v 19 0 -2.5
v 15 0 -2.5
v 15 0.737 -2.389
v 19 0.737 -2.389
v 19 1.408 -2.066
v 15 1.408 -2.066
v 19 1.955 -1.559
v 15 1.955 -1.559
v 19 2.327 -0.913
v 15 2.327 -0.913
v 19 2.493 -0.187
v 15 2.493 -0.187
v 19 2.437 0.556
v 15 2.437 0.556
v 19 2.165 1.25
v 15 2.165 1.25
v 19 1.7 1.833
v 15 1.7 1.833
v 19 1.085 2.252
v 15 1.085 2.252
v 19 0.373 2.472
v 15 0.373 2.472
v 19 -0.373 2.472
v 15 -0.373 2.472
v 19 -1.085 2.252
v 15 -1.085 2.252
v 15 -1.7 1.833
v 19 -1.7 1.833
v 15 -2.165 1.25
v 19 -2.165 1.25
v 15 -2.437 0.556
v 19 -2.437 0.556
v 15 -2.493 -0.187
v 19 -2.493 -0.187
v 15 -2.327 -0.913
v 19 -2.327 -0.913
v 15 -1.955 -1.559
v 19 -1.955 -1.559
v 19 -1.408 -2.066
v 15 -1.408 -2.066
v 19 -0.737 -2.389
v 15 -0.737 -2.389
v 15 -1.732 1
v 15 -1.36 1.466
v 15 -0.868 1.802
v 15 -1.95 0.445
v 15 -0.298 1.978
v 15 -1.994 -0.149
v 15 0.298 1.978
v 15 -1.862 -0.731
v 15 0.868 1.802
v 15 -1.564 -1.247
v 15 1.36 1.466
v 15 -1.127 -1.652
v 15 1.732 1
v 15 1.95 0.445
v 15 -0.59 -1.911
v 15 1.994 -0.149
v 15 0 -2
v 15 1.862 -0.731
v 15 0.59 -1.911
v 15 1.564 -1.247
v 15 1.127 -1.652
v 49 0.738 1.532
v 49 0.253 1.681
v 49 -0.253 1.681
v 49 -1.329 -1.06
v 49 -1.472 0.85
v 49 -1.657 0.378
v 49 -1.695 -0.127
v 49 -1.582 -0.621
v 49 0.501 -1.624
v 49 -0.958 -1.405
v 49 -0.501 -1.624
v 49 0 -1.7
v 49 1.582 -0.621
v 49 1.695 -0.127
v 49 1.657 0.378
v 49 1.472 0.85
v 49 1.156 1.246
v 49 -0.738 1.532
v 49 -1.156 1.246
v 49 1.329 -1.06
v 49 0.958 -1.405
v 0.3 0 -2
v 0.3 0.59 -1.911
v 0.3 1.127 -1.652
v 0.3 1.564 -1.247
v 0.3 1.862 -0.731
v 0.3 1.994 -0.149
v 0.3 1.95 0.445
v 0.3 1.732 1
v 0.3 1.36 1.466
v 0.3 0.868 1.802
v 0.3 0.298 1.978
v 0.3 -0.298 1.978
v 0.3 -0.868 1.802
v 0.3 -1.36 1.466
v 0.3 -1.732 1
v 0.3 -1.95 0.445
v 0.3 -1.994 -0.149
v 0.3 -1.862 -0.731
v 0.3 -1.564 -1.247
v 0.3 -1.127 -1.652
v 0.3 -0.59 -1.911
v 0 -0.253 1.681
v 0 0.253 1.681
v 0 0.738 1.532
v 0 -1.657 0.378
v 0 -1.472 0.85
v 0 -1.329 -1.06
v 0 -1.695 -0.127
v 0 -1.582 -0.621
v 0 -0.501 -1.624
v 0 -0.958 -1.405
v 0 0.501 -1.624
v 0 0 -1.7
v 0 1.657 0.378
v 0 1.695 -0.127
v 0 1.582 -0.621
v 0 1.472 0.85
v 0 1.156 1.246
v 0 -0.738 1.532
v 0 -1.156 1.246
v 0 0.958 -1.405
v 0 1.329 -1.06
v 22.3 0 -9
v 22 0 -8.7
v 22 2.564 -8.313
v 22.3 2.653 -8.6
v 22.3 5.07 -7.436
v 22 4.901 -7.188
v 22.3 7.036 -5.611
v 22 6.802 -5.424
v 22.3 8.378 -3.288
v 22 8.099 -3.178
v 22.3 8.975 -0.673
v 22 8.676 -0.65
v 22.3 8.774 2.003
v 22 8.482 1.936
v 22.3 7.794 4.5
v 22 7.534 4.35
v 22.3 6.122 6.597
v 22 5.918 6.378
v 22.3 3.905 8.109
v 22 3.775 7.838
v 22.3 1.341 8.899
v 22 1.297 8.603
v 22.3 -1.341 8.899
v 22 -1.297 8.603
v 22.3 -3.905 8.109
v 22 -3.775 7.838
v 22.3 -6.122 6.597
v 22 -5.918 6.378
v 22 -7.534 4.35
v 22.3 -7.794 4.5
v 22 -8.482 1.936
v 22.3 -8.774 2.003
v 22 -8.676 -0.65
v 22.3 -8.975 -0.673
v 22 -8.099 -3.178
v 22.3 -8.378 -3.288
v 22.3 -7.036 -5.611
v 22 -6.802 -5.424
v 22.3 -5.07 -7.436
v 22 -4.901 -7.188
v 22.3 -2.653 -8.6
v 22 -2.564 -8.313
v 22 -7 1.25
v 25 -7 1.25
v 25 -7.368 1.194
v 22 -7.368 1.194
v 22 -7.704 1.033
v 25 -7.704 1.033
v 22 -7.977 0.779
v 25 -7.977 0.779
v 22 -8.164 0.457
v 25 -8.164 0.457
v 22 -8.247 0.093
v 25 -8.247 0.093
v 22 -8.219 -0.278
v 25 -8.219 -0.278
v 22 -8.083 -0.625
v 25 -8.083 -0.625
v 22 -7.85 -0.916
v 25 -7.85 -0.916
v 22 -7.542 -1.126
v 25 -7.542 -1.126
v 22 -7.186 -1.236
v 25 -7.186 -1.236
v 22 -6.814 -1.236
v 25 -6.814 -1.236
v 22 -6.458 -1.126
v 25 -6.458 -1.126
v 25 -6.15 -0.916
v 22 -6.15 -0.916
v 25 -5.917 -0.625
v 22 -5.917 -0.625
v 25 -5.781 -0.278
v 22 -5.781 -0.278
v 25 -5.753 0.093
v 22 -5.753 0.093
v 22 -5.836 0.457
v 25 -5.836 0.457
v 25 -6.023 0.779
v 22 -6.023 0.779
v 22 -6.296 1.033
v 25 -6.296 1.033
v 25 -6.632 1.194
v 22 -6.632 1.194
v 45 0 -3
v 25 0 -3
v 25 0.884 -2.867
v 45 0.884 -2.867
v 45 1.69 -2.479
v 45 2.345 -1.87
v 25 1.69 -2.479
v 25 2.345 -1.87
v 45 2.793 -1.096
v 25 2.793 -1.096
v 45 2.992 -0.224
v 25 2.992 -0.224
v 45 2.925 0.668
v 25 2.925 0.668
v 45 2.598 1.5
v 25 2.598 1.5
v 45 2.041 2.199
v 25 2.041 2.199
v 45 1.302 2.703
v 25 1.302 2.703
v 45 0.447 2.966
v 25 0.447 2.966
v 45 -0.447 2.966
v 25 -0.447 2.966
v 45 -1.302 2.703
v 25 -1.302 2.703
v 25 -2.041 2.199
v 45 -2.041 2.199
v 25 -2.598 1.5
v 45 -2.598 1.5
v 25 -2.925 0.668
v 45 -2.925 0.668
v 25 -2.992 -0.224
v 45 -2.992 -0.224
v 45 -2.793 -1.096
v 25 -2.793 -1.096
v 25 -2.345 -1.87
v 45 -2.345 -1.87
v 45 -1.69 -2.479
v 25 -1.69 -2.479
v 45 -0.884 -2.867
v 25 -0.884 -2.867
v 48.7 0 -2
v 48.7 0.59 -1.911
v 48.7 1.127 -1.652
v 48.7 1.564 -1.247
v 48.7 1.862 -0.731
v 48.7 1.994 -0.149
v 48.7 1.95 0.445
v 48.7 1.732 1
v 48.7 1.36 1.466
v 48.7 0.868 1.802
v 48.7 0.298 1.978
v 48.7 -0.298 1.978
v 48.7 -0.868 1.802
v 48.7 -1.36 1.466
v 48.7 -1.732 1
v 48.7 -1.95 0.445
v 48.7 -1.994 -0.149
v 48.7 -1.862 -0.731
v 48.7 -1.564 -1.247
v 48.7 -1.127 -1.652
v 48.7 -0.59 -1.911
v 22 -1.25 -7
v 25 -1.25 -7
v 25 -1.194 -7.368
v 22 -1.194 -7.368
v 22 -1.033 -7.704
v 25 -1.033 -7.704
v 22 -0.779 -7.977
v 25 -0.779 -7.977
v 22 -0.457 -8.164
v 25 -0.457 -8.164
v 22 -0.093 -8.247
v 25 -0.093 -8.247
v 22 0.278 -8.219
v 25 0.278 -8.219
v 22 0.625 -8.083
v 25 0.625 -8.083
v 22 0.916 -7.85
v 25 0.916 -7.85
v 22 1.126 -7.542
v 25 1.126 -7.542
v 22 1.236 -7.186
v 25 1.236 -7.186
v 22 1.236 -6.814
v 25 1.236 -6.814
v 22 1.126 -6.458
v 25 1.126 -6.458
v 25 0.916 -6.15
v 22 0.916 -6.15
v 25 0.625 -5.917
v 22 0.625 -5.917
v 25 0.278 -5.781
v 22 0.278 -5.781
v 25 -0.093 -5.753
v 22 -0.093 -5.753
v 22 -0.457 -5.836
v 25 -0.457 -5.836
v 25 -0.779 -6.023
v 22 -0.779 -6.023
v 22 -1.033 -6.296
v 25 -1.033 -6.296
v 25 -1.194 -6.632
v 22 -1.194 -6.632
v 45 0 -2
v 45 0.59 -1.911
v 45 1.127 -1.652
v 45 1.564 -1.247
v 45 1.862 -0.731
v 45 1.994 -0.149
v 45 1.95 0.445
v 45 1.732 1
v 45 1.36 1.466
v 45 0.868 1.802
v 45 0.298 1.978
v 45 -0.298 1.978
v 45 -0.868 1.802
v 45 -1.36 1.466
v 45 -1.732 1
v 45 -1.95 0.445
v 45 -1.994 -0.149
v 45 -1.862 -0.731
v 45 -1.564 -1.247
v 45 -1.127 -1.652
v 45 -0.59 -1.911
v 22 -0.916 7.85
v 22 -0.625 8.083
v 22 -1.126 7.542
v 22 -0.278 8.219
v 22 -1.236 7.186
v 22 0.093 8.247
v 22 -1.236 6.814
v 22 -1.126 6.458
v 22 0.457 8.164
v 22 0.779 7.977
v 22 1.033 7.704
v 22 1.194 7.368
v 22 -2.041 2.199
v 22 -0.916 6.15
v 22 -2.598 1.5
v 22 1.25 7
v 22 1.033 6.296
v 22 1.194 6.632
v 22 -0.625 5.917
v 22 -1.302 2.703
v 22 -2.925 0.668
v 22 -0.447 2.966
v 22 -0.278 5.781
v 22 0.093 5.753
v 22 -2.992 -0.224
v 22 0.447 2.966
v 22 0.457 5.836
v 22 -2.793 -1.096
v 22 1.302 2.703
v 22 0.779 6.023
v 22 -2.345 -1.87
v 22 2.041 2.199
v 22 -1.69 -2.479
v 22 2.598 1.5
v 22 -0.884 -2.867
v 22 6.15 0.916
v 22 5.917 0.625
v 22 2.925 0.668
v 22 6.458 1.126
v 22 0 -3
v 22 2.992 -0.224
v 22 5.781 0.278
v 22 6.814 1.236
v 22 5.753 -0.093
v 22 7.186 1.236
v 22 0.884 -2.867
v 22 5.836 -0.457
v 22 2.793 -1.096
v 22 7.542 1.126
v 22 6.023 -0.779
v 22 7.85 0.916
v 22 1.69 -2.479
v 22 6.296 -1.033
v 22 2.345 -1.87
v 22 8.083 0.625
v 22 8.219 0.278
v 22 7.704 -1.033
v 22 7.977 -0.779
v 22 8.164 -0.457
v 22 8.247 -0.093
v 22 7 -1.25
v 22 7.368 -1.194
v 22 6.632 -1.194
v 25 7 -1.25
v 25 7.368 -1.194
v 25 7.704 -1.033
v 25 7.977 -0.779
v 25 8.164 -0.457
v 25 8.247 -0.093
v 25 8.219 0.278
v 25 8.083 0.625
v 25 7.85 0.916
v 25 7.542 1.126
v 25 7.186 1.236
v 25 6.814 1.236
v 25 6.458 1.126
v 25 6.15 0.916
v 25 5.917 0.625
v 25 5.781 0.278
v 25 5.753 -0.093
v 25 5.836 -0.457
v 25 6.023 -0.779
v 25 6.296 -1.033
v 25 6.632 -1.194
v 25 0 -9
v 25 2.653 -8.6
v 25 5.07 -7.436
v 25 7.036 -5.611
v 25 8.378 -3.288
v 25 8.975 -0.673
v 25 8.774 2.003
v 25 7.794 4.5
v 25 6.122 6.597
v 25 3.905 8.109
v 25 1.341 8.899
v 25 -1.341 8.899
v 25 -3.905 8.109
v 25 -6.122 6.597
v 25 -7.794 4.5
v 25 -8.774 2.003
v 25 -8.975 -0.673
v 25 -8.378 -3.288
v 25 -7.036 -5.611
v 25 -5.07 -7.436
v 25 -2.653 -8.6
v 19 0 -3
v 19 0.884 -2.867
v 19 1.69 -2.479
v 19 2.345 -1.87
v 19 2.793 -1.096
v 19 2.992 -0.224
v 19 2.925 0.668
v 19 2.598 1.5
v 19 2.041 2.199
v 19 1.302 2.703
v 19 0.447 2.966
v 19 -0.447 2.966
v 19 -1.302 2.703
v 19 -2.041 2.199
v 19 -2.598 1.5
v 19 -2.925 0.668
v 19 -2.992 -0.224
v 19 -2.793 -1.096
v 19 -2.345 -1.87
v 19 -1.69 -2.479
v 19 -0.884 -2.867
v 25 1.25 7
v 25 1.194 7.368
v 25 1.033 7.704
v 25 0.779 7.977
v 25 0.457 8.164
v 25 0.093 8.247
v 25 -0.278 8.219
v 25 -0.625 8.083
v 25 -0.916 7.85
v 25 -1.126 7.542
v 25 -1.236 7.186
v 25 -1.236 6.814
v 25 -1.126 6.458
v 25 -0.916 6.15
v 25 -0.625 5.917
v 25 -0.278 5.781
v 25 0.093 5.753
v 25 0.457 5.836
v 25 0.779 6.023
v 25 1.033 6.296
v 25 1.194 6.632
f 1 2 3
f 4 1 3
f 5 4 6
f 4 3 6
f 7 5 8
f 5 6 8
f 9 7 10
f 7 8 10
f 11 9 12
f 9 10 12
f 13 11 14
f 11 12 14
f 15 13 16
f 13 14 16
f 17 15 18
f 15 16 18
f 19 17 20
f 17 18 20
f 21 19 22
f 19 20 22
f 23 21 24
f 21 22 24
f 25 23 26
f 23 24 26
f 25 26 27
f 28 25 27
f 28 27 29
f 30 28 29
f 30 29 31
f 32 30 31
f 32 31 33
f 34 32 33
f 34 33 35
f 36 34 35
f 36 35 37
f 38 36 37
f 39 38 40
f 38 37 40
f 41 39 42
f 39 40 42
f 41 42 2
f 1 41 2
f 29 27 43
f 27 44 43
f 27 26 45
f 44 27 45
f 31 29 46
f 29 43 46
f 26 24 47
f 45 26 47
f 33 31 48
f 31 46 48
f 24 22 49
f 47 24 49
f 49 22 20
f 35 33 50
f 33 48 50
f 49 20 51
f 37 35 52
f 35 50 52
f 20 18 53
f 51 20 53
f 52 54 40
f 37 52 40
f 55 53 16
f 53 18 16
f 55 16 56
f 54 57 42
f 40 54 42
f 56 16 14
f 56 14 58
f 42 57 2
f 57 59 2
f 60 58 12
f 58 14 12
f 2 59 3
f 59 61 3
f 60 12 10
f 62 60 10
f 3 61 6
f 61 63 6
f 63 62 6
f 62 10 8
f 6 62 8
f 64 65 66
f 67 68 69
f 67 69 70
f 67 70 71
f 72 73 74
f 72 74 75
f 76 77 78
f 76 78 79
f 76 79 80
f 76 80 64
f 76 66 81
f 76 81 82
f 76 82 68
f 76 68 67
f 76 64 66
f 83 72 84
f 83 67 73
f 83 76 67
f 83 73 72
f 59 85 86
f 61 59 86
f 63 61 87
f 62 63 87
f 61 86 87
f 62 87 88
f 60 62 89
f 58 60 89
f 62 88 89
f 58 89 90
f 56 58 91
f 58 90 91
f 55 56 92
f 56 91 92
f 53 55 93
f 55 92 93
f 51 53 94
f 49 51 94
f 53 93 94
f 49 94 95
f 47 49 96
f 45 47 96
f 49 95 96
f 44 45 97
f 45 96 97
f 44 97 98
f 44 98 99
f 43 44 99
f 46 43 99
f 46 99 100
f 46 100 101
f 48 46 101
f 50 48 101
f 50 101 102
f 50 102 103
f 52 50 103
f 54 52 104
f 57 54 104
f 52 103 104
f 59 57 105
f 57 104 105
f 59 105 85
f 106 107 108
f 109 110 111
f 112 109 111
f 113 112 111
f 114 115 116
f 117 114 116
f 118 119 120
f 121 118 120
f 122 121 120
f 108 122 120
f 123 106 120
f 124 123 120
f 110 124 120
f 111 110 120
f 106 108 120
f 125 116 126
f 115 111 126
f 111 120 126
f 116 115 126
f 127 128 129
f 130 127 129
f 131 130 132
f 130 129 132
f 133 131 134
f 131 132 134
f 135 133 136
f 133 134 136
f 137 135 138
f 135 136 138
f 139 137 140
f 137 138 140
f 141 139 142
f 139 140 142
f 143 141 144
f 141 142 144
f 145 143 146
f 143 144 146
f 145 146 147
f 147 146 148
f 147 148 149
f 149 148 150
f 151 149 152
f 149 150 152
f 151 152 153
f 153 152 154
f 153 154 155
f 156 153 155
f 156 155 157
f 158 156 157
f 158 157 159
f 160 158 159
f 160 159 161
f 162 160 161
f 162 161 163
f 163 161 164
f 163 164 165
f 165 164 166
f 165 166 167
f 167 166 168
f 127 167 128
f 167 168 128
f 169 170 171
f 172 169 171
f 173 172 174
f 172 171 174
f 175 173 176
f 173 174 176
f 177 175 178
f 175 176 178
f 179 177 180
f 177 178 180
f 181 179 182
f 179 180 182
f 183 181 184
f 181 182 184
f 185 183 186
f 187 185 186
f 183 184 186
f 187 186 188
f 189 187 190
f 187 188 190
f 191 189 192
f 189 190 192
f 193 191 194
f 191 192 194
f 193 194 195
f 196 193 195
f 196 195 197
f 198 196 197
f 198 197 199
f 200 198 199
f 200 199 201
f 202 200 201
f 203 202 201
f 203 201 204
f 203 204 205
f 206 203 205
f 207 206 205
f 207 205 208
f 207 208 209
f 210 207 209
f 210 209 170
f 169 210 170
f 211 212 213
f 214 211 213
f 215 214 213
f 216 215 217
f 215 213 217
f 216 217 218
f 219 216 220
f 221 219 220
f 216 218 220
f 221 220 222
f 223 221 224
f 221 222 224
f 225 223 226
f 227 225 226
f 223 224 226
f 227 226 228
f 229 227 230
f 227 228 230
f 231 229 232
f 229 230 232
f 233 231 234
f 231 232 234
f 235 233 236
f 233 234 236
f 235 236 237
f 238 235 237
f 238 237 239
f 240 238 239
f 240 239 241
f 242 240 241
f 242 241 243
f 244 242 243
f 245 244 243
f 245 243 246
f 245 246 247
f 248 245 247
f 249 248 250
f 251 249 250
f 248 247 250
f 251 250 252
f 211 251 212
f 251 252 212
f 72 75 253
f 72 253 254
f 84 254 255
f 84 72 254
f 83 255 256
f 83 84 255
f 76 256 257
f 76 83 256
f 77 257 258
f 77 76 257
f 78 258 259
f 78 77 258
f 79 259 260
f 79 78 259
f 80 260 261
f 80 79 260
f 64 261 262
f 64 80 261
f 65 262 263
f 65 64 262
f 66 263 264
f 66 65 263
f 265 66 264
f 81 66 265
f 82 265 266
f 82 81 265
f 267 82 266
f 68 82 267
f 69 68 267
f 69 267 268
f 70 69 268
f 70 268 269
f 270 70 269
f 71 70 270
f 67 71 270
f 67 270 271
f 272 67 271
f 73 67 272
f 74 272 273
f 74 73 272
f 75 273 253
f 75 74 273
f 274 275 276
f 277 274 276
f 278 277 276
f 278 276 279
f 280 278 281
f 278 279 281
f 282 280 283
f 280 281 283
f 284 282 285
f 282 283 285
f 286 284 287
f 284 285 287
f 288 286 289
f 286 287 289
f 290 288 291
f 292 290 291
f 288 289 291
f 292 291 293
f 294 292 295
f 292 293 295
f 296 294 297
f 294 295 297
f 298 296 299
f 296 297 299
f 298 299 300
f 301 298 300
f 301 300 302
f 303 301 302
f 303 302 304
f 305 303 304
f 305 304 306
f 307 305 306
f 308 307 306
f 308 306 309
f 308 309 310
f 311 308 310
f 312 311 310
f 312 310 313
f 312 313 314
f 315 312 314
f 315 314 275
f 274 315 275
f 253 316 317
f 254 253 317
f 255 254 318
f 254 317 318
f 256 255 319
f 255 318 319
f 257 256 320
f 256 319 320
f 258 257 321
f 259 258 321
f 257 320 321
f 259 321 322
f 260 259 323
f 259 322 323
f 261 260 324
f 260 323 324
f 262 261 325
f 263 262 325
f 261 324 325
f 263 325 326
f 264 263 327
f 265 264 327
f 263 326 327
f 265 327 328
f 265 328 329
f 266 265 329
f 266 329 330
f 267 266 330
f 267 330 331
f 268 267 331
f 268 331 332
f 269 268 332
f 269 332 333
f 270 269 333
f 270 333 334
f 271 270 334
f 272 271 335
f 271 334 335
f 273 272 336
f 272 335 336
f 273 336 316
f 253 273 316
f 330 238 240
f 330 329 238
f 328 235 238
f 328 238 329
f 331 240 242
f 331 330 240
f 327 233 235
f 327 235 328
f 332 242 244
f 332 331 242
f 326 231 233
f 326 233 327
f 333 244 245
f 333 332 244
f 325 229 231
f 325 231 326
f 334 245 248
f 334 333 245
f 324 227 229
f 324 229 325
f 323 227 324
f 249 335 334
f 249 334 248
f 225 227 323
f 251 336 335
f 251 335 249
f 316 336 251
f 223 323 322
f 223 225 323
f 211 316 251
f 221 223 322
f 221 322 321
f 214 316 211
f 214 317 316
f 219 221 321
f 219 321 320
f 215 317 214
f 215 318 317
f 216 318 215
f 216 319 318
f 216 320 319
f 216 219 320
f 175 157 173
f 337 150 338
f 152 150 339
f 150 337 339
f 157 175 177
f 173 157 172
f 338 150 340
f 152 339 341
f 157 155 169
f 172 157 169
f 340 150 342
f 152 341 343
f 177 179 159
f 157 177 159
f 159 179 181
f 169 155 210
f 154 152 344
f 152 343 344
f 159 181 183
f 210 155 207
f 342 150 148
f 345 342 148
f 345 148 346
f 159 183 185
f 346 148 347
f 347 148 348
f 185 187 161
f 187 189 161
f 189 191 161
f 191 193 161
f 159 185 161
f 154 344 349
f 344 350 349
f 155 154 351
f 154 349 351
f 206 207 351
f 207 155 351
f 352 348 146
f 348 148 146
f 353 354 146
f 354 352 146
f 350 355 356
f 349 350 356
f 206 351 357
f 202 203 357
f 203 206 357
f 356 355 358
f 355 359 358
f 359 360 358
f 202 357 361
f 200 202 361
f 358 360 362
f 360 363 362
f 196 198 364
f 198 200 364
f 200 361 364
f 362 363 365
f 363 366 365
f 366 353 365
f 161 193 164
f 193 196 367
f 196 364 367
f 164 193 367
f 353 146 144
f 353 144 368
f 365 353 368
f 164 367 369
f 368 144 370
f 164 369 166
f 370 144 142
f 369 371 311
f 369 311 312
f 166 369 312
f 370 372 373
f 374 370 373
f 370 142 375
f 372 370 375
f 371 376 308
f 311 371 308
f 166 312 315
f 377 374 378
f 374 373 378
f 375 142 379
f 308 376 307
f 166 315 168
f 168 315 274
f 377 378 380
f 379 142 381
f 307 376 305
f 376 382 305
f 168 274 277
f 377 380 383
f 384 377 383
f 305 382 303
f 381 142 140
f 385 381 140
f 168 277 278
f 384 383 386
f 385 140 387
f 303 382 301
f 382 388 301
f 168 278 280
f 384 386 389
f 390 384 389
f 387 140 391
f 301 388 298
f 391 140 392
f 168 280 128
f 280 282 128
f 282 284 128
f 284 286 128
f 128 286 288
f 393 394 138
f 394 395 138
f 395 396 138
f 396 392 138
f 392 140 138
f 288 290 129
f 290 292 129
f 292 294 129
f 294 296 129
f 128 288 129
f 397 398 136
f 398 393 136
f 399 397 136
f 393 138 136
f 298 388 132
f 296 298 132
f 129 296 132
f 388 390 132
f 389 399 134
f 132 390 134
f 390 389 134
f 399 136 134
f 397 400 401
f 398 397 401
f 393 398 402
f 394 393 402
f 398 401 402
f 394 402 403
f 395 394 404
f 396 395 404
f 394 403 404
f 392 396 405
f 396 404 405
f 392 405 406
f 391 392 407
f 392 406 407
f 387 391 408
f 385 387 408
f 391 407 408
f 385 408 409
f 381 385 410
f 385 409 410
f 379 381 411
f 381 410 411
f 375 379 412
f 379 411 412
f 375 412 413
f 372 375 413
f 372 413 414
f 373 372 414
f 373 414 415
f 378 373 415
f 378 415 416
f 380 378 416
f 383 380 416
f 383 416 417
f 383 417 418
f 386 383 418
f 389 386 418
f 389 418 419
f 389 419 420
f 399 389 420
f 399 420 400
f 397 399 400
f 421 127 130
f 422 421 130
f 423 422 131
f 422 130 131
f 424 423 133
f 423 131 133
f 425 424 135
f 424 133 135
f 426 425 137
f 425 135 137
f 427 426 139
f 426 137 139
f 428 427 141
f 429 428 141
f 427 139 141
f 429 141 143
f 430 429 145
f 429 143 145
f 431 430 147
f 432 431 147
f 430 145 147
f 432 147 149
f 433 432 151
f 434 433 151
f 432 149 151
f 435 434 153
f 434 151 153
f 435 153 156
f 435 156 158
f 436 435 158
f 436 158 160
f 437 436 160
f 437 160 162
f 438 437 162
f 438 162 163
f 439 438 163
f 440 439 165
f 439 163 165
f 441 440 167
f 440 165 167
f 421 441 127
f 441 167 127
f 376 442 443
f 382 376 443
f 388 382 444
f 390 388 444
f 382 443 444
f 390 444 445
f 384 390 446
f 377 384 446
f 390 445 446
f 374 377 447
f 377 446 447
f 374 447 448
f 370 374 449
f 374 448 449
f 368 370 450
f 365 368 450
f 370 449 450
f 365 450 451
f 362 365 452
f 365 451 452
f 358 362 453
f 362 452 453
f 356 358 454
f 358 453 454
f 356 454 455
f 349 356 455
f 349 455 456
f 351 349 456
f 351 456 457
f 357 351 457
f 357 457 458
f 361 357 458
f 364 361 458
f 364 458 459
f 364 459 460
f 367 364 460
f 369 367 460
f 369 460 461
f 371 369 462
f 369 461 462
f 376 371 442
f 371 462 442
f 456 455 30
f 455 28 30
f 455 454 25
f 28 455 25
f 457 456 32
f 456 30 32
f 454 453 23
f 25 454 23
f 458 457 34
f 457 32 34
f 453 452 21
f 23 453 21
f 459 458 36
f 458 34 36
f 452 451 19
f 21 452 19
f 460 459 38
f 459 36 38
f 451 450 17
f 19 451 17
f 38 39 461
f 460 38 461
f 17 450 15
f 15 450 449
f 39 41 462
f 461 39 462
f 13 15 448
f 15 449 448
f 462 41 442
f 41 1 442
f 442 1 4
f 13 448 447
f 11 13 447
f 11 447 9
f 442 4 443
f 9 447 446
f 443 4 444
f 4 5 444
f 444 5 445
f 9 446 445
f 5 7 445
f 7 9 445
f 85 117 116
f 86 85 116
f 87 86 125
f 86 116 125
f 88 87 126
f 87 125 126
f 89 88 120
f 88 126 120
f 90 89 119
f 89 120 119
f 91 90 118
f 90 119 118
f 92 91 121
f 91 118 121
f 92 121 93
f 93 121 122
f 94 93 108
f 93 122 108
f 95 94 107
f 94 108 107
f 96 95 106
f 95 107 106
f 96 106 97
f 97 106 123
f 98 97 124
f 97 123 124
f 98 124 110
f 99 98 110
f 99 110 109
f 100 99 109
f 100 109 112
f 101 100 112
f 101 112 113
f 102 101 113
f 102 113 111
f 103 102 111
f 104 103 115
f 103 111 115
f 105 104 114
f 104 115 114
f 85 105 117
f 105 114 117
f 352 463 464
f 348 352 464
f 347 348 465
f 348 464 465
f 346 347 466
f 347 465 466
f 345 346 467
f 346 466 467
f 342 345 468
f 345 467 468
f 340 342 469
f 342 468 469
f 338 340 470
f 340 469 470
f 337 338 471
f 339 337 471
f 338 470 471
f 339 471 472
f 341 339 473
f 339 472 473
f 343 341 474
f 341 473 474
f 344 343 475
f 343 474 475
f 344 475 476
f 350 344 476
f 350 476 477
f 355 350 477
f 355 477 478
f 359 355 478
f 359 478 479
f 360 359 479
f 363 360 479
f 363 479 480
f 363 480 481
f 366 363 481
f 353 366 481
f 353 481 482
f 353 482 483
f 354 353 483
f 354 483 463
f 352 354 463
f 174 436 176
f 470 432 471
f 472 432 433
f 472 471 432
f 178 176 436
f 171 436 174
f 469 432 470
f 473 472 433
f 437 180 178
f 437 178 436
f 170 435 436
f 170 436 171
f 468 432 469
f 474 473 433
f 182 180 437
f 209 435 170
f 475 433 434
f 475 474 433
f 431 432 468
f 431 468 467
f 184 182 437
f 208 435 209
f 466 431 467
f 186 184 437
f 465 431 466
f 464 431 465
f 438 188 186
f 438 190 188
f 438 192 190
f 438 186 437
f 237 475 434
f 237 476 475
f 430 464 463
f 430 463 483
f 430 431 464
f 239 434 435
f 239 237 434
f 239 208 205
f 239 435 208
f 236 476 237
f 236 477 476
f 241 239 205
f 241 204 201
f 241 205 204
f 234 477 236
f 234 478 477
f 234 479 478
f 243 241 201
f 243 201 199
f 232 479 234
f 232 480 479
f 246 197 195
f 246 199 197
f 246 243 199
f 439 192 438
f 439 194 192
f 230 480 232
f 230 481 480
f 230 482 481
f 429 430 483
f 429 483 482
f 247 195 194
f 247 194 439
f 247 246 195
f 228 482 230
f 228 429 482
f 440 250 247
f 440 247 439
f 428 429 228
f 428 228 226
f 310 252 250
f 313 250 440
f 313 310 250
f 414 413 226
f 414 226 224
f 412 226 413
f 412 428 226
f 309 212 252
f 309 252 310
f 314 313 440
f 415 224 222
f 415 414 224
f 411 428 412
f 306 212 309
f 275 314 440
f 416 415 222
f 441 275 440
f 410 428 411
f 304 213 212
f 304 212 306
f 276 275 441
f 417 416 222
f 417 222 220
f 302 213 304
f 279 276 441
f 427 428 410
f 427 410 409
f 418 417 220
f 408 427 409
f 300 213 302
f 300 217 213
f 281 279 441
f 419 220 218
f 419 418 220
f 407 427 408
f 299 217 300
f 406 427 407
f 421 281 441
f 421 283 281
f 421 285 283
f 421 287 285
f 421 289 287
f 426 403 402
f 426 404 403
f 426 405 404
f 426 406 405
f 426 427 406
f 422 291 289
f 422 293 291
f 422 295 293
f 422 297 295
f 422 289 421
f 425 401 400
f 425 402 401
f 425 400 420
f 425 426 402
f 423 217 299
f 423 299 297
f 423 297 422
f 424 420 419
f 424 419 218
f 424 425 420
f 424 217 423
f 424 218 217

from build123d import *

# Parameters (mm, degrees)
SKETCH_1_R               = 2
EXTRUDE_1_DEPTH          = 15
SKETCH_2_R               = 2.5
EXTRUDE_2_DEPTH          = 4
SKETCH_3_R               = 3
EXTRUDE_3_DEPTH          = 3
SKETCH_4_R               = 9
EXTRUDE_4_DEPTH          = 3
SKETCH_5_R               = 3
EXTRUDE_5_DEPTH          = 20
SKETCH_8_R               = 2
EXTRUDE_6_DEPTH          = 4
HOLE_WIZARD_M3_2_D       = 2.5
PATTERN_CIRCULAR_2_COUNT = 4
CHAMFER_1_SIZE           = 0.3


with BuildPart() as part:
    # 草图1 → 凸台-拉伸1 (new body)
    with BuildSketch(Plane(origin=(0, 0, 0), x_dir=(0, 0, -1), z_dir=(1, 0, 0))):
        Circle(SKETCH_1_R)
    extrude(amount=EXTRUDE_1_DEPTH)

    # 草图2 → 凸台-拉伸2 (add)
    with BuildSketch(Plane(origin=(15, 0, 0), x_dir=(0, 0, -1), z_dir=(1, 0, 0))):
        Circle(SKETCH_2_R)
    extrude(amount=EXTRUDE_2_DEPTH)

    # 草图3 → 凸台-拉伸3 (add)
    with BuildSketch(Plane(origin=(19, 0, 0), x_dir=(0, 0, -1), z_dir=(1, 0, 0))):
        Circle(SKETCH_3_R)
    extrude(amount=EXTRUDE_3_DEPTH)

    # 草图4 → 凸台-拉伸4 (add)
    with BuildSketch(Plane(origin=(22, 0, 0), x_dir=(0, 0, -1), z_dir=(1, 0, 0))):
        Circle(SKETCH_4_R)
    extrude(amount=EXTRUDE_4_DEPTH)

    # 草图5 → 凸台-拉伸5 (add)
    with BuildSketch(Plane(origin=(25, 0, 0), x_dir=(0, 0, -1), z_dir=(1, 0, 0))):
        Circle(SKETCH_5_R)
    extrude(amount=EXTRUDE_5_DEPTH)

    # 草图8 → 凸台-拉伸6 (add)
    with BuildSketch(Plane(origin=(45, 0, 0), x_dir=(0, 0, -1), z_dir=(1, 0, 0))):
        Circle(SKETCH_8_R)
    extrude(amount=EXTRUDE_6_DEPTH)

    # M3 螺纹孔2 (through all)
    with Locations(Plane.ZY.offset(-22)):
        with Locations((0, 7)):
            hole_wizard_m3_2 = Hole(HOLE_WIZARD_M3_2_D / 2)

    # 阵列(圆周)2: M3 螺纹孔2 ×4 about axis
    pattern_circular_2_axis = Axis((0, 0, 0), (1, 0, 0))
    for i in range(1, PATTERN_CIRCULAR_2_COUNT):
        add(hole_wizard_m3_2.rotate(pattern_circular_2_axis, i * 360 / PATTERN_CIRCULAR_2_COUNT), mode=Mode.SUBTRACT)

    # 倒角1
    chamfer_1_edges = [part.edges().sort_by_distance(p)[0] for p in [
        (22, 0, 9),
        (0, 0, 2),
        (49, 0, 2),
    ]]
    chamfer(chamfer_1_edges, length=CHAMFER_1_SIZE)


solid = part.part
